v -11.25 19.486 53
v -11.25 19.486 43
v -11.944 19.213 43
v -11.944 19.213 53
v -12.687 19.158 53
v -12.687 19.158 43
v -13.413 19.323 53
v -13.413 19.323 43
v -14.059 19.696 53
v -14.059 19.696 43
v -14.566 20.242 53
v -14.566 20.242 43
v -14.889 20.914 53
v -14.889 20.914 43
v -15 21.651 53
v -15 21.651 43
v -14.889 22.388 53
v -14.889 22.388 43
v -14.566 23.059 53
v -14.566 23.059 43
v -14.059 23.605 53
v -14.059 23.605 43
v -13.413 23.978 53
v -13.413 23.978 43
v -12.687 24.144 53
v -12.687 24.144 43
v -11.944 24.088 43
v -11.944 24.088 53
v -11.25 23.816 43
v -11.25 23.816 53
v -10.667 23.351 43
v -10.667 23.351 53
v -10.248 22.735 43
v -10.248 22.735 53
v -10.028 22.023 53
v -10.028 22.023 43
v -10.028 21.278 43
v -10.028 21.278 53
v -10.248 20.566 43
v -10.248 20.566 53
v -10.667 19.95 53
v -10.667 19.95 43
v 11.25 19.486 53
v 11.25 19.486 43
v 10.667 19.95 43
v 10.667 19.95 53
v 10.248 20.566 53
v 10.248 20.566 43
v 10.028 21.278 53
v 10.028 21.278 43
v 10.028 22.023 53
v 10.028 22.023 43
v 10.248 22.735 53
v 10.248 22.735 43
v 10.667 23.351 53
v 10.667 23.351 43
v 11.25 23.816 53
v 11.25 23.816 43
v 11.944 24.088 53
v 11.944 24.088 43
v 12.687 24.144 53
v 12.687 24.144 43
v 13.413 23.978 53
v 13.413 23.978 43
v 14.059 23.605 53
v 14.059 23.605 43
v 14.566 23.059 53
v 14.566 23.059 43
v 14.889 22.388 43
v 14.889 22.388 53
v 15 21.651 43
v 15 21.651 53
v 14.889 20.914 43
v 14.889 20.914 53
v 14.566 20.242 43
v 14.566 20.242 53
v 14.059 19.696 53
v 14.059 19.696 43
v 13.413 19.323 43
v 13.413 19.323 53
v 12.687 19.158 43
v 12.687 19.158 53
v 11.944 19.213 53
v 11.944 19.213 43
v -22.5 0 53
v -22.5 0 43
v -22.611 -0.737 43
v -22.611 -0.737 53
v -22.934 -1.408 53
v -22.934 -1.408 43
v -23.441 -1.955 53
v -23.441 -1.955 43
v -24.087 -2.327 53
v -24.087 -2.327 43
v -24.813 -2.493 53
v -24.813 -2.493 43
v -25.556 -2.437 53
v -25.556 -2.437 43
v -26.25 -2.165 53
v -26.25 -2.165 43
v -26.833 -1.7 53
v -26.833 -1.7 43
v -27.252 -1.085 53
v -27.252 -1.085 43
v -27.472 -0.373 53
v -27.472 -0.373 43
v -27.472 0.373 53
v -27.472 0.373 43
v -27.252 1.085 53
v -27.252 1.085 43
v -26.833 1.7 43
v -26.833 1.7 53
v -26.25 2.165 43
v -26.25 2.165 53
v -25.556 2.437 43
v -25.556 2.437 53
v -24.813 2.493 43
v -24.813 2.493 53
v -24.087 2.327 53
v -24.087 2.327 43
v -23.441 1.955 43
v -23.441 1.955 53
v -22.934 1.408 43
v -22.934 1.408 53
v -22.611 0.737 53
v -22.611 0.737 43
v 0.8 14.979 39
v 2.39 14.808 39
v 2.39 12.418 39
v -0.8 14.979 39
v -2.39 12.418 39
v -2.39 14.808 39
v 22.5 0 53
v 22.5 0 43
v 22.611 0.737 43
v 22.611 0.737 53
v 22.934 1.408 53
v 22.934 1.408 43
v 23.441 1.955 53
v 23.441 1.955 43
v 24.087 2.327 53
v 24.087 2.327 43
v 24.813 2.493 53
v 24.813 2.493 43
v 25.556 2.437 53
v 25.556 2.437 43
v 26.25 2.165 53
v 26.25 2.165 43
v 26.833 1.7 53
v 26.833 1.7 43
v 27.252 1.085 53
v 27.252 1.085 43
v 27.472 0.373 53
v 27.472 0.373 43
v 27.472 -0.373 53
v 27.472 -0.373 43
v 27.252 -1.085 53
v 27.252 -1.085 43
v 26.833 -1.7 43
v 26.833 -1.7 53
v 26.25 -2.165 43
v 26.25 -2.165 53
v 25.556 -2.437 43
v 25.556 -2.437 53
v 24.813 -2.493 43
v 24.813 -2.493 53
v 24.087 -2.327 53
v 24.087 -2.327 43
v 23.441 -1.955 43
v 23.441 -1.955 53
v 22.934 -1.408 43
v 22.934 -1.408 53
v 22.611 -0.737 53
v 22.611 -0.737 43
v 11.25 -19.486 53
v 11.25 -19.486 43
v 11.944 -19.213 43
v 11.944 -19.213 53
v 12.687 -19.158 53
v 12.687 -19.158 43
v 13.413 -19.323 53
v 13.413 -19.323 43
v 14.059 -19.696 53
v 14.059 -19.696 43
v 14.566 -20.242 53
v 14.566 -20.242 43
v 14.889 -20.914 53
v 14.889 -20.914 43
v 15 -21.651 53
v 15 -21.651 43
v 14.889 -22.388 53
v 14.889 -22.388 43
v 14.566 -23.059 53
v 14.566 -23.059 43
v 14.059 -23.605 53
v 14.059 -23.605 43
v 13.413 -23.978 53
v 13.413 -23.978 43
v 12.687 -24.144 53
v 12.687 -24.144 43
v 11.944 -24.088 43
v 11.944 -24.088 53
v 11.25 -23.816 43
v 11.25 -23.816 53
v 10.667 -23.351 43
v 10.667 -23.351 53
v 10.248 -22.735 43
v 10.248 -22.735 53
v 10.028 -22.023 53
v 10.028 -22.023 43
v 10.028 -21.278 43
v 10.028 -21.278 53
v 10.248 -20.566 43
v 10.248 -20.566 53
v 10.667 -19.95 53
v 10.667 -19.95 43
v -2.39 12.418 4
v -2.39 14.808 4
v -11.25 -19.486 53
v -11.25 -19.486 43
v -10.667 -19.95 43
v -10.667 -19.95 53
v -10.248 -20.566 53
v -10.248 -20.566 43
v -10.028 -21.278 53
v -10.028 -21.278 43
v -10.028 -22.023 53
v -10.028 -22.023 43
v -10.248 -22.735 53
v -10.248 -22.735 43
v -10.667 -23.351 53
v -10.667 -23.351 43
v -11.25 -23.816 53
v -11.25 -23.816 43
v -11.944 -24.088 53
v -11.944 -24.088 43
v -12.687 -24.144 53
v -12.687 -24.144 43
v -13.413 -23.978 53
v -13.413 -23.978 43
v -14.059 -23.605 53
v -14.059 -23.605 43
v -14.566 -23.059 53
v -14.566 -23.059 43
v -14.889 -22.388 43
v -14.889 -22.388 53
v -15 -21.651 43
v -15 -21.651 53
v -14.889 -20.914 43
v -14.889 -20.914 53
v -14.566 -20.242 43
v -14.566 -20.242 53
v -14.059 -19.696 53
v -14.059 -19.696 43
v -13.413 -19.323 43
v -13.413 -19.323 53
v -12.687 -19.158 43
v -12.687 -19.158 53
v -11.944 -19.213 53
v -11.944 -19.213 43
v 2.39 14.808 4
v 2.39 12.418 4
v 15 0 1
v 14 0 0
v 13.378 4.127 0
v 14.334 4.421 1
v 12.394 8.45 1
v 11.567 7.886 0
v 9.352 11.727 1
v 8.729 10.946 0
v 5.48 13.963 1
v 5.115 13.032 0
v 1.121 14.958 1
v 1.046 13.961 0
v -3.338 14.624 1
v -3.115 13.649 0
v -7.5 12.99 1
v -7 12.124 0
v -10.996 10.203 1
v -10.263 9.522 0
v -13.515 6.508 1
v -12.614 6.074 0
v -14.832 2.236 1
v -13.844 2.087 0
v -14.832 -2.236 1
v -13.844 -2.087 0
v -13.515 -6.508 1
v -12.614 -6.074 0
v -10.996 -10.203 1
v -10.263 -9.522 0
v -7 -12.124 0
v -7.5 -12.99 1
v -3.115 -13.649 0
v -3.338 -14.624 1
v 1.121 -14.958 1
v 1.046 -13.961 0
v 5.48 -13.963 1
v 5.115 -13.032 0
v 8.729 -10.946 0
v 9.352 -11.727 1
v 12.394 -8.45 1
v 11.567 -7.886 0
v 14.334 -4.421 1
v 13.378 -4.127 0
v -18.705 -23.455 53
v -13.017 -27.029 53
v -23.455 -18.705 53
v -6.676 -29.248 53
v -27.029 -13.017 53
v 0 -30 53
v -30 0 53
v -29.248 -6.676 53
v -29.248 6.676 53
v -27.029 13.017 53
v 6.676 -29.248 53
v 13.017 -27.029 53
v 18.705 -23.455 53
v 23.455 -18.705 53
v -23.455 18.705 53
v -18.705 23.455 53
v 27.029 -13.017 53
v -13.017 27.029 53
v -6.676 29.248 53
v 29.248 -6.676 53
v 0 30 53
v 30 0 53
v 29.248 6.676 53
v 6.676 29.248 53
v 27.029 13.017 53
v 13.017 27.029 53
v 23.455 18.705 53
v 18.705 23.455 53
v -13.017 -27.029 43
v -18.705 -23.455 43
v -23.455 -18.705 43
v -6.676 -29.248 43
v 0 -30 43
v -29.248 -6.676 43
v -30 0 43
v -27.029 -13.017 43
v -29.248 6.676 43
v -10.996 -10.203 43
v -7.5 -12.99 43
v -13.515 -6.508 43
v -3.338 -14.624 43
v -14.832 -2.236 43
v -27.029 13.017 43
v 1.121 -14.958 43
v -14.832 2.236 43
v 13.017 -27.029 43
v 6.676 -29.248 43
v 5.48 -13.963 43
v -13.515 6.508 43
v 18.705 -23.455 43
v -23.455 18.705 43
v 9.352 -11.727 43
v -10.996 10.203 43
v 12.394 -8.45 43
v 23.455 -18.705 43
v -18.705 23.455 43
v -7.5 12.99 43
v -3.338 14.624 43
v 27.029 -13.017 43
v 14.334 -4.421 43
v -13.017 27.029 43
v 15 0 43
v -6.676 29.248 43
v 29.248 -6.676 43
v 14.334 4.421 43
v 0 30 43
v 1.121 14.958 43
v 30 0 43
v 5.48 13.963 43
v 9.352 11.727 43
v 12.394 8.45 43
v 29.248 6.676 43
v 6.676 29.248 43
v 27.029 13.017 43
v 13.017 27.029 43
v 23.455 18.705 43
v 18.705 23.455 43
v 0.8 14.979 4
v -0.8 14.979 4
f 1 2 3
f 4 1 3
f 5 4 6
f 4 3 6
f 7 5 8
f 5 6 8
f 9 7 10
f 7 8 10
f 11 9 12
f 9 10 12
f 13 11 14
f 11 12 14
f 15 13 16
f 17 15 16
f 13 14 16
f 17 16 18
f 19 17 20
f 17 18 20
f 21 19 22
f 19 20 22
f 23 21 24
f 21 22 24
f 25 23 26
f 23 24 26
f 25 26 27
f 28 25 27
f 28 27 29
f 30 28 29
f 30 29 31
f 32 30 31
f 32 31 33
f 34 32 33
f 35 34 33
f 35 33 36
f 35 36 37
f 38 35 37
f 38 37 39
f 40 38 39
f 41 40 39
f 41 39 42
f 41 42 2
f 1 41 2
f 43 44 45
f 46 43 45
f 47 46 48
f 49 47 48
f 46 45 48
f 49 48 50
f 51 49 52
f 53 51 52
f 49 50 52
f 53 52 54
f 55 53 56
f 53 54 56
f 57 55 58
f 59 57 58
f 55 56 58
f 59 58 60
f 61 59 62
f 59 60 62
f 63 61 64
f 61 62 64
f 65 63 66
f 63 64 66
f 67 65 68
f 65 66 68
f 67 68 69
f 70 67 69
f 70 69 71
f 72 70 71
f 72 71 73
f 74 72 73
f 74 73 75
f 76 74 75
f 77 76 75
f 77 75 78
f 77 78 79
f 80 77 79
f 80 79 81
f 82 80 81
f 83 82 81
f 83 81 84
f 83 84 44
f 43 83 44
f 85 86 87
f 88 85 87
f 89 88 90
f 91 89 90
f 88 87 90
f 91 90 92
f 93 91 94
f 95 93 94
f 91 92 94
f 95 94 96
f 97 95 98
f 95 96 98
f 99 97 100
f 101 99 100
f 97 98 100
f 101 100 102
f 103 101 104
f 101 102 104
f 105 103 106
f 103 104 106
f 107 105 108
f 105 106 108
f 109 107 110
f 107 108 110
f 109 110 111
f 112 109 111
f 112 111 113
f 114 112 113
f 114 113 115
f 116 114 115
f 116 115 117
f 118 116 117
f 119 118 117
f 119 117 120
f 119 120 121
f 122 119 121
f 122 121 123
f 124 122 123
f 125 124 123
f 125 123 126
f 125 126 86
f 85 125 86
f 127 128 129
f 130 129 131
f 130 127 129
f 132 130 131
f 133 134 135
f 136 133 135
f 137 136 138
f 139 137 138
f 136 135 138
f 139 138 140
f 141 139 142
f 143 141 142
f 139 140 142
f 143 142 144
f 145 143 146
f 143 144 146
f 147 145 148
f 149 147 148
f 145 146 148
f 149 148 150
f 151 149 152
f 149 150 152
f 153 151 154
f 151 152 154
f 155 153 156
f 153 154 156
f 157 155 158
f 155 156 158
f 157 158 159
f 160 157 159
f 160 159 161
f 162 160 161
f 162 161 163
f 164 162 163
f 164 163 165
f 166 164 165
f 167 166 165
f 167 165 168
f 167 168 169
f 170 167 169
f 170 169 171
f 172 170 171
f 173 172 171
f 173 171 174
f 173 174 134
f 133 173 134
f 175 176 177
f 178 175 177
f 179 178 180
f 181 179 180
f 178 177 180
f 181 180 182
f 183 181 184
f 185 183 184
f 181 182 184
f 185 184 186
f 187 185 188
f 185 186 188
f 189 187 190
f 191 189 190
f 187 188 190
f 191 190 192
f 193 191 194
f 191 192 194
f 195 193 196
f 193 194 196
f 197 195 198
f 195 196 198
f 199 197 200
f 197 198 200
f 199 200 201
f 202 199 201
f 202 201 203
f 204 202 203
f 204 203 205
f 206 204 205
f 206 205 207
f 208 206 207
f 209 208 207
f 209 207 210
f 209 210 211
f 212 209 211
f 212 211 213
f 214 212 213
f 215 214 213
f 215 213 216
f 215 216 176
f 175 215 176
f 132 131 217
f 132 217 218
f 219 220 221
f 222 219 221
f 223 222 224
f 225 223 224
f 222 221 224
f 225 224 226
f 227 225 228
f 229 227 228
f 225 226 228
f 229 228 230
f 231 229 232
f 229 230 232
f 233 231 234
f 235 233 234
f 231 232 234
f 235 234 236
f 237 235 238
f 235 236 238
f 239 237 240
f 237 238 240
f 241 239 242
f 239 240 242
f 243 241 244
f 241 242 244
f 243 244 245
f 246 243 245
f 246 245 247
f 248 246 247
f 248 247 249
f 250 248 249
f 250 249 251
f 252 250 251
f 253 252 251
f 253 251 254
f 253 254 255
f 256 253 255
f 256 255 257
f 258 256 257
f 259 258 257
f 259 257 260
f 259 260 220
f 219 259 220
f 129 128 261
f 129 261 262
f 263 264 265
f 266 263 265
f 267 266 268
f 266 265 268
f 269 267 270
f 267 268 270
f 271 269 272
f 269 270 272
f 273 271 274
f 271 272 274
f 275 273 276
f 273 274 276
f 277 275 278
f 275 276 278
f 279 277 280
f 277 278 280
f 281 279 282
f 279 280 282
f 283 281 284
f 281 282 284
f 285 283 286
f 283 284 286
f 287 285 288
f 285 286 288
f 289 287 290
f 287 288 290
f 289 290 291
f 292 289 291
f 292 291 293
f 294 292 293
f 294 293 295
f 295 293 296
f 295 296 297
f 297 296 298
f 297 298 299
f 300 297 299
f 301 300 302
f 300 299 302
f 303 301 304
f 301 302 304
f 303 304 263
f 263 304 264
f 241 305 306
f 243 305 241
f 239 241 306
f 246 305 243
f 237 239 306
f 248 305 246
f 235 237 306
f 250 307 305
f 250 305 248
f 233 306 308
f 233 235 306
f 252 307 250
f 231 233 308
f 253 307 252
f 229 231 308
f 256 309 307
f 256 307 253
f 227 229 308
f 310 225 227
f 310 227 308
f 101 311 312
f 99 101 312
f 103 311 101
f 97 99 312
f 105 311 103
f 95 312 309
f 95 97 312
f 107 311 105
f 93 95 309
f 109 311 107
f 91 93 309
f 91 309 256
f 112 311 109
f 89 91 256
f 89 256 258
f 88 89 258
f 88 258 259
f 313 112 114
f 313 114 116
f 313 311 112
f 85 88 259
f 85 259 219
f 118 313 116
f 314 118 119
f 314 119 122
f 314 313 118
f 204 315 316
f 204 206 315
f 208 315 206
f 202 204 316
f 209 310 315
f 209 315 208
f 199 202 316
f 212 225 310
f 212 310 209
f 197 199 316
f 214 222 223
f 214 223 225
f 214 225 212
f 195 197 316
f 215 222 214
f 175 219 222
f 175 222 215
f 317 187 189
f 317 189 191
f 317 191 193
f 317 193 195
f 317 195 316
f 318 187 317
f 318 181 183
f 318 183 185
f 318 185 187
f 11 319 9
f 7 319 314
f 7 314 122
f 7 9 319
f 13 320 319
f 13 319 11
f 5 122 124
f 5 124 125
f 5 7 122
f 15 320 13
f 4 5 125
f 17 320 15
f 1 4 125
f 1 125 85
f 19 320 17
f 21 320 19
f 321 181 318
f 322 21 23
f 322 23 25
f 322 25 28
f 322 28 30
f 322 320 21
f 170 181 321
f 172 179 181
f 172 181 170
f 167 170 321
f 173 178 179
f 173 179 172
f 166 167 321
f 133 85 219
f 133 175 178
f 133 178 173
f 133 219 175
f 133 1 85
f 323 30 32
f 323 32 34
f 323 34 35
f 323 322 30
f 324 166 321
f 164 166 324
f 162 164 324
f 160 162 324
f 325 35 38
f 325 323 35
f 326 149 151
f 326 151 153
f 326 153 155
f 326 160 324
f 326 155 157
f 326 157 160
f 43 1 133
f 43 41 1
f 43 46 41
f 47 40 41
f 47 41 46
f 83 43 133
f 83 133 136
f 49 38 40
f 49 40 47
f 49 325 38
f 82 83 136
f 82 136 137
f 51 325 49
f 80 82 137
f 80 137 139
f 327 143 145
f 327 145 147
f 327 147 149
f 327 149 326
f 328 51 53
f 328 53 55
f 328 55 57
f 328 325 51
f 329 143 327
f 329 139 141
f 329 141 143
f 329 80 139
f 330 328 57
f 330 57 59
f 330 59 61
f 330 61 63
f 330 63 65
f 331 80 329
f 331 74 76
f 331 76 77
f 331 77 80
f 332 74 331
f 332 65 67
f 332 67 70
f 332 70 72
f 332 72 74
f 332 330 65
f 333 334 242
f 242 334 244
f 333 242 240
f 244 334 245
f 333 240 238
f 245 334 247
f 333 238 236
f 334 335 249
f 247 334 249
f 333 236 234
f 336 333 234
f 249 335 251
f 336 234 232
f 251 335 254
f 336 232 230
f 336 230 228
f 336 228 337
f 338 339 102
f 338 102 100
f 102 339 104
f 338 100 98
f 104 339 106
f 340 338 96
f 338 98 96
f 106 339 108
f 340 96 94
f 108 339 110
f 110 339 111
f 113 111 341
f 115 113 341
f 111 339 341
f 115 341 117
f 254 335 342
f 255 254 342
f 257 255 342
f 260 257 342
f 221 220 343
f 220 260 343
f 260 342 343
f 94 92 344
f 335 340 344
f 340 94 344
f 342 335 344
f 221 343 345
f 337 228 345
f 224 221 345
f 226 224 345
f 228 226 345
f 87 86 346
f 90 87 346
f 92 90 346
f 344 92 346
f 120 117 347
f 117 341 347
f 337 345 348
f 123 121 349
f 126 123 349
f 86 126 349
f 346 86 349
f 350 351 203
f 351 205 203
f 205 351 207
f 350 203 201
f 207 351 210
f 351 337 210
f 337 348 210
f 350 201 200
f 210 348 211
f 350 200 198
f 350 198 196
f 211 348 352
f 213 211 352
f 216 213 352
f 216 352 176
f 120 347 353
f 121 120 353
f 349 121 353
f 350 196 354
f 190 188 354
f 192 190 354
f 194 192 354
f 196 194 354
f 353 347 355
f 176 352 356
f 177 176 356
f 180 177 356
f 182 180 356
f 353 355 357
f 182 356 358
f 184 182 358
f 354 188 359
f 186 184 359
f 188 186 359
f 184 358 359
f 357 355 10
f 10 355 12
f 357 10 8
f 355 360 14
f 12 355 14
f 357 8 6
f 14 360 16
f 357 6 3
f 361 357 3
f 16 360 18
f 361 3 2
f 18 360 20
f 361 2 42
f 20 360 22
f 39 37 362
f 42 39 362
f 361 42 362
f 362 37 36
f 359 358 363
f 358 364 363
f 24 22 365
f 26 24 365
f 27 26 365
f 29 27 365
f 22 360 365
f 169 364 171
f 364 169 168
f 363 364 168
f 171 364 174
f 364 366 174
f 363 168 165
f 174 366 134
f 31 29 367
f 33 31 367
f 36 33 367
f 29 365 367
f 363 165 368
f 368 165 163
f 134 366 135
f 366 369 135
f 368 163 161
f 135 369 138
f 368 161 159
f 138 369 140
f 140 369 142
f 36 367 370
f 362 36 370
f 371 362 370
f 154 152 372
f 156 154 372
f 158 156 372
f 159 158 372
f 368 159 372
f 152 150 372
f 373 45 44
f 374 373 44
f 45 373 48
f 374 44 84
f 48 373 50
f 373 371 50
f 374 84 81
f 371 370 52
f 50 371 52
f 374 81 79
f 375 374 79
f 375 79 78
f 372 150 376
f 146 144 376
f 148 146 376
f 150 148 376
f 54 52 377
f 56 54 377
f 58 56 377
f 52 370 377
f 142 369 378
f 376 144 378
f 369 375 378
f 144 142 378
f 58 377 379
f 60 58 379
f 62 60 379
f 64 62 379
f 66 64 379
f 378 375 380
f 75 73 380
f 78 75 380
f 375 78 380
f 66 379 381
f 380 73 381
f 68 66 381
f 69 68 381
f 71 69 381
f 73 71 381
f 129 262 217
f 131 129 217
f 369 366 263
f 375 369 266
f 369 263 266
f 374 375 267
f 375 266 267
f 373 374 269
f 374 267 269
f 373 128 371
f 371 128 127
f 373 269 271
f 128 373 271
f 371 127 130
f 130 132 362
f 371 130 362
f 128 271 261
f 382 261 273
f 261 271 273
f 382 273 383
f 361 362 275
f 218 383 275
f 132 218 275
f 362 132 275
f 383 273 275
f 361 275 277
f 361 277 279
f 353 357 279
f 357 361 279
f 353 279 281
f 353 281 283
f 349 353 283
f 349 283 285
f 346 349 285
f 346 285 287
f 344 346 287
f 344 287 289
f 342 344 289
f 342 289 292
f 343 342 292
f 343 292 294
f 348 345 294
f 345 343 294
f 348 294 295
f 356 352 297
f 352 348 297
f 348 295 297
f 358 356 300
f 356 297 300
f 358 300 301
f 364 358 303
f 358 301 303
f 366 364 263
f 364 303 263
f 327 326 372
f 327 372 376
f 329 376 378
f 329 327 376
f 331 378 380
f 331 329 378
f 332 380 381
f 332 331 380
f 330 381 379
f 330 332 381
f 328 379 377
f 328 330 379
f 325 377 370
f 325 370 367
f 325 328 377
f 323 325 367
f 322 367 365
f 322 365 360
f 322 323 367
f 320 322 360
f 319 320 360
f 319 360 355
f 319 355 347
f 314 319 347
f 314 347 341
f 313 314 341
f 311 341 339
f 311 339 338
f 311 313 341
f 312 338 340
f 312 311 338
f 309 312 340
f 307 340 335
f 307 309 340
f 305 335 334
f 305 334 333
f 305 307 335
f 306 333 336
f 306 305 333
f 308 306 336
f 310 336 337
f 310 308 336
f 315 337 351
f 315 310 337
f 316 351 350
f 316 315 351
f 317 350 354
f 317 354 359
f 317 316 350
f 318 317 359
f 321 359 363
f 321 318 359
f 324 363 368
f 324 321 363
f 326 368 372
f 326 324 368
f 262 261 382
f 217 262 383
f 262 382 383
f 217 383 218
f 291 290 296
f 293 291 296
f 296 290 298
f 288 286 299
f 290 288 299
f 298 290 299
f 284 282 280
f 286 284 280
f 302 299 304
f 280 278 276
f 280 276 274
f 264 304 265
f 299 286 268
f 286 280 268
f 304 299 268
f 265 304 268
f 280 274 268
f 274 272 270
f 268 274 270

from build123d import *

# Parameters (mm, degrees)
SZKIC1_R                    = 15
DODANIE_WYCI_GNI_CIE1_DEPTH = 53
SFAZOWANIE1_SIZE            = 1
WYTNIJ_WYCI_GNI_CIE1_DEPTH  = 35
SZKIC3_R                    = 30
DODANIE_WYCI_GNI_CIE2_DEPTH = 10
SZKIC4_R                    = 2.5
WYTNIJ_WYCI_GNI_CIE2_DEPTH  = 61.406953242
SZYK_KO_OWY1_COUNT          = 6


with BuildPart() as part:
    # Szkic1 → Dodanie-wyciągnięcie1 (new body)
    with BuildSketch(Plane.XY):
        Circle(SZKIC1_R)
    extrude(amount=DODANIE_WYCI_GNI_CIE1_DEPTH)

    # Sfazowanie1
    sfazowanie1_edges = [part.edges().sort_by_distance(p)[0] for p in [
        (-15, 0, 0),
    ]]
    chamfer(sfazowanie1_edges, length=SFAZOWANIE1_SIZE)

    # Szkic2 → Wytnij-wyciągnięcie1 (cut)
    with BuildSketch(Plane(origin=(0, 0, 4), x_dir=(-1, 0, 0), z_dir=(0, 0, -1))):
        with BuildLine():
            Line((-2.39, 14.808372632), (-2.39, 12.418372632))
            Line((-2.39, 12.418372632), (2.39, 12.418372632))
            Line((2.39, 12.418372632), (2.39, 14.808372632))
            ThreePointArc((2.39, 14.808372632), (0, 15), (-2.39, 14.808372632))
        make_face()
    extrude(amount=-WYTNIJ_WYCI_GNI_CIE1_DEPTH, mode=Mode.SUBTRACT)

    # Szkic3 → Dodanie-wyciągnięcie2 (add)
    with BuildSketch(Plane.XY.offset(53)):
        Circle(SZKIC3_R)
    extrude(amount=-DODANIE_WYCI_GNI_CIE2_DEPTH)

    # Szkic4 → Wytnij-wyciągnięcie2 (cut, through all)
    with BuildSketch(Plane(origin=(0, 0, 43), x_dir=(-1, 0, 0), z_dir=(0, 0, -1))):
        with Locations((-25, 0)):
            Circle(SZKIC4_R)
    wytnij_wyci_gni_cie2 = extrude(amount=-WYTNIJ_WYCI_GNI_CIE2_DEPTH, mode=Mode.SUBTRACT)

    # Szyk kołowy1: Wytnij-wyciągnięcie2 ×6 about axis
    szyk_ko_owy1_axis = Axis((0, 0, 0), (0, 0, 1))
    for i in range(1, SZYK_KO_OWY1_COUNT):
        add(wytnij_wyci_gni_cie2.rotate(szyk_ko_owy1_axis, i * 360 / SZYK_KO_OWY1_COUNT), mode=Mode.SUBTRACT)


solid = part.part
